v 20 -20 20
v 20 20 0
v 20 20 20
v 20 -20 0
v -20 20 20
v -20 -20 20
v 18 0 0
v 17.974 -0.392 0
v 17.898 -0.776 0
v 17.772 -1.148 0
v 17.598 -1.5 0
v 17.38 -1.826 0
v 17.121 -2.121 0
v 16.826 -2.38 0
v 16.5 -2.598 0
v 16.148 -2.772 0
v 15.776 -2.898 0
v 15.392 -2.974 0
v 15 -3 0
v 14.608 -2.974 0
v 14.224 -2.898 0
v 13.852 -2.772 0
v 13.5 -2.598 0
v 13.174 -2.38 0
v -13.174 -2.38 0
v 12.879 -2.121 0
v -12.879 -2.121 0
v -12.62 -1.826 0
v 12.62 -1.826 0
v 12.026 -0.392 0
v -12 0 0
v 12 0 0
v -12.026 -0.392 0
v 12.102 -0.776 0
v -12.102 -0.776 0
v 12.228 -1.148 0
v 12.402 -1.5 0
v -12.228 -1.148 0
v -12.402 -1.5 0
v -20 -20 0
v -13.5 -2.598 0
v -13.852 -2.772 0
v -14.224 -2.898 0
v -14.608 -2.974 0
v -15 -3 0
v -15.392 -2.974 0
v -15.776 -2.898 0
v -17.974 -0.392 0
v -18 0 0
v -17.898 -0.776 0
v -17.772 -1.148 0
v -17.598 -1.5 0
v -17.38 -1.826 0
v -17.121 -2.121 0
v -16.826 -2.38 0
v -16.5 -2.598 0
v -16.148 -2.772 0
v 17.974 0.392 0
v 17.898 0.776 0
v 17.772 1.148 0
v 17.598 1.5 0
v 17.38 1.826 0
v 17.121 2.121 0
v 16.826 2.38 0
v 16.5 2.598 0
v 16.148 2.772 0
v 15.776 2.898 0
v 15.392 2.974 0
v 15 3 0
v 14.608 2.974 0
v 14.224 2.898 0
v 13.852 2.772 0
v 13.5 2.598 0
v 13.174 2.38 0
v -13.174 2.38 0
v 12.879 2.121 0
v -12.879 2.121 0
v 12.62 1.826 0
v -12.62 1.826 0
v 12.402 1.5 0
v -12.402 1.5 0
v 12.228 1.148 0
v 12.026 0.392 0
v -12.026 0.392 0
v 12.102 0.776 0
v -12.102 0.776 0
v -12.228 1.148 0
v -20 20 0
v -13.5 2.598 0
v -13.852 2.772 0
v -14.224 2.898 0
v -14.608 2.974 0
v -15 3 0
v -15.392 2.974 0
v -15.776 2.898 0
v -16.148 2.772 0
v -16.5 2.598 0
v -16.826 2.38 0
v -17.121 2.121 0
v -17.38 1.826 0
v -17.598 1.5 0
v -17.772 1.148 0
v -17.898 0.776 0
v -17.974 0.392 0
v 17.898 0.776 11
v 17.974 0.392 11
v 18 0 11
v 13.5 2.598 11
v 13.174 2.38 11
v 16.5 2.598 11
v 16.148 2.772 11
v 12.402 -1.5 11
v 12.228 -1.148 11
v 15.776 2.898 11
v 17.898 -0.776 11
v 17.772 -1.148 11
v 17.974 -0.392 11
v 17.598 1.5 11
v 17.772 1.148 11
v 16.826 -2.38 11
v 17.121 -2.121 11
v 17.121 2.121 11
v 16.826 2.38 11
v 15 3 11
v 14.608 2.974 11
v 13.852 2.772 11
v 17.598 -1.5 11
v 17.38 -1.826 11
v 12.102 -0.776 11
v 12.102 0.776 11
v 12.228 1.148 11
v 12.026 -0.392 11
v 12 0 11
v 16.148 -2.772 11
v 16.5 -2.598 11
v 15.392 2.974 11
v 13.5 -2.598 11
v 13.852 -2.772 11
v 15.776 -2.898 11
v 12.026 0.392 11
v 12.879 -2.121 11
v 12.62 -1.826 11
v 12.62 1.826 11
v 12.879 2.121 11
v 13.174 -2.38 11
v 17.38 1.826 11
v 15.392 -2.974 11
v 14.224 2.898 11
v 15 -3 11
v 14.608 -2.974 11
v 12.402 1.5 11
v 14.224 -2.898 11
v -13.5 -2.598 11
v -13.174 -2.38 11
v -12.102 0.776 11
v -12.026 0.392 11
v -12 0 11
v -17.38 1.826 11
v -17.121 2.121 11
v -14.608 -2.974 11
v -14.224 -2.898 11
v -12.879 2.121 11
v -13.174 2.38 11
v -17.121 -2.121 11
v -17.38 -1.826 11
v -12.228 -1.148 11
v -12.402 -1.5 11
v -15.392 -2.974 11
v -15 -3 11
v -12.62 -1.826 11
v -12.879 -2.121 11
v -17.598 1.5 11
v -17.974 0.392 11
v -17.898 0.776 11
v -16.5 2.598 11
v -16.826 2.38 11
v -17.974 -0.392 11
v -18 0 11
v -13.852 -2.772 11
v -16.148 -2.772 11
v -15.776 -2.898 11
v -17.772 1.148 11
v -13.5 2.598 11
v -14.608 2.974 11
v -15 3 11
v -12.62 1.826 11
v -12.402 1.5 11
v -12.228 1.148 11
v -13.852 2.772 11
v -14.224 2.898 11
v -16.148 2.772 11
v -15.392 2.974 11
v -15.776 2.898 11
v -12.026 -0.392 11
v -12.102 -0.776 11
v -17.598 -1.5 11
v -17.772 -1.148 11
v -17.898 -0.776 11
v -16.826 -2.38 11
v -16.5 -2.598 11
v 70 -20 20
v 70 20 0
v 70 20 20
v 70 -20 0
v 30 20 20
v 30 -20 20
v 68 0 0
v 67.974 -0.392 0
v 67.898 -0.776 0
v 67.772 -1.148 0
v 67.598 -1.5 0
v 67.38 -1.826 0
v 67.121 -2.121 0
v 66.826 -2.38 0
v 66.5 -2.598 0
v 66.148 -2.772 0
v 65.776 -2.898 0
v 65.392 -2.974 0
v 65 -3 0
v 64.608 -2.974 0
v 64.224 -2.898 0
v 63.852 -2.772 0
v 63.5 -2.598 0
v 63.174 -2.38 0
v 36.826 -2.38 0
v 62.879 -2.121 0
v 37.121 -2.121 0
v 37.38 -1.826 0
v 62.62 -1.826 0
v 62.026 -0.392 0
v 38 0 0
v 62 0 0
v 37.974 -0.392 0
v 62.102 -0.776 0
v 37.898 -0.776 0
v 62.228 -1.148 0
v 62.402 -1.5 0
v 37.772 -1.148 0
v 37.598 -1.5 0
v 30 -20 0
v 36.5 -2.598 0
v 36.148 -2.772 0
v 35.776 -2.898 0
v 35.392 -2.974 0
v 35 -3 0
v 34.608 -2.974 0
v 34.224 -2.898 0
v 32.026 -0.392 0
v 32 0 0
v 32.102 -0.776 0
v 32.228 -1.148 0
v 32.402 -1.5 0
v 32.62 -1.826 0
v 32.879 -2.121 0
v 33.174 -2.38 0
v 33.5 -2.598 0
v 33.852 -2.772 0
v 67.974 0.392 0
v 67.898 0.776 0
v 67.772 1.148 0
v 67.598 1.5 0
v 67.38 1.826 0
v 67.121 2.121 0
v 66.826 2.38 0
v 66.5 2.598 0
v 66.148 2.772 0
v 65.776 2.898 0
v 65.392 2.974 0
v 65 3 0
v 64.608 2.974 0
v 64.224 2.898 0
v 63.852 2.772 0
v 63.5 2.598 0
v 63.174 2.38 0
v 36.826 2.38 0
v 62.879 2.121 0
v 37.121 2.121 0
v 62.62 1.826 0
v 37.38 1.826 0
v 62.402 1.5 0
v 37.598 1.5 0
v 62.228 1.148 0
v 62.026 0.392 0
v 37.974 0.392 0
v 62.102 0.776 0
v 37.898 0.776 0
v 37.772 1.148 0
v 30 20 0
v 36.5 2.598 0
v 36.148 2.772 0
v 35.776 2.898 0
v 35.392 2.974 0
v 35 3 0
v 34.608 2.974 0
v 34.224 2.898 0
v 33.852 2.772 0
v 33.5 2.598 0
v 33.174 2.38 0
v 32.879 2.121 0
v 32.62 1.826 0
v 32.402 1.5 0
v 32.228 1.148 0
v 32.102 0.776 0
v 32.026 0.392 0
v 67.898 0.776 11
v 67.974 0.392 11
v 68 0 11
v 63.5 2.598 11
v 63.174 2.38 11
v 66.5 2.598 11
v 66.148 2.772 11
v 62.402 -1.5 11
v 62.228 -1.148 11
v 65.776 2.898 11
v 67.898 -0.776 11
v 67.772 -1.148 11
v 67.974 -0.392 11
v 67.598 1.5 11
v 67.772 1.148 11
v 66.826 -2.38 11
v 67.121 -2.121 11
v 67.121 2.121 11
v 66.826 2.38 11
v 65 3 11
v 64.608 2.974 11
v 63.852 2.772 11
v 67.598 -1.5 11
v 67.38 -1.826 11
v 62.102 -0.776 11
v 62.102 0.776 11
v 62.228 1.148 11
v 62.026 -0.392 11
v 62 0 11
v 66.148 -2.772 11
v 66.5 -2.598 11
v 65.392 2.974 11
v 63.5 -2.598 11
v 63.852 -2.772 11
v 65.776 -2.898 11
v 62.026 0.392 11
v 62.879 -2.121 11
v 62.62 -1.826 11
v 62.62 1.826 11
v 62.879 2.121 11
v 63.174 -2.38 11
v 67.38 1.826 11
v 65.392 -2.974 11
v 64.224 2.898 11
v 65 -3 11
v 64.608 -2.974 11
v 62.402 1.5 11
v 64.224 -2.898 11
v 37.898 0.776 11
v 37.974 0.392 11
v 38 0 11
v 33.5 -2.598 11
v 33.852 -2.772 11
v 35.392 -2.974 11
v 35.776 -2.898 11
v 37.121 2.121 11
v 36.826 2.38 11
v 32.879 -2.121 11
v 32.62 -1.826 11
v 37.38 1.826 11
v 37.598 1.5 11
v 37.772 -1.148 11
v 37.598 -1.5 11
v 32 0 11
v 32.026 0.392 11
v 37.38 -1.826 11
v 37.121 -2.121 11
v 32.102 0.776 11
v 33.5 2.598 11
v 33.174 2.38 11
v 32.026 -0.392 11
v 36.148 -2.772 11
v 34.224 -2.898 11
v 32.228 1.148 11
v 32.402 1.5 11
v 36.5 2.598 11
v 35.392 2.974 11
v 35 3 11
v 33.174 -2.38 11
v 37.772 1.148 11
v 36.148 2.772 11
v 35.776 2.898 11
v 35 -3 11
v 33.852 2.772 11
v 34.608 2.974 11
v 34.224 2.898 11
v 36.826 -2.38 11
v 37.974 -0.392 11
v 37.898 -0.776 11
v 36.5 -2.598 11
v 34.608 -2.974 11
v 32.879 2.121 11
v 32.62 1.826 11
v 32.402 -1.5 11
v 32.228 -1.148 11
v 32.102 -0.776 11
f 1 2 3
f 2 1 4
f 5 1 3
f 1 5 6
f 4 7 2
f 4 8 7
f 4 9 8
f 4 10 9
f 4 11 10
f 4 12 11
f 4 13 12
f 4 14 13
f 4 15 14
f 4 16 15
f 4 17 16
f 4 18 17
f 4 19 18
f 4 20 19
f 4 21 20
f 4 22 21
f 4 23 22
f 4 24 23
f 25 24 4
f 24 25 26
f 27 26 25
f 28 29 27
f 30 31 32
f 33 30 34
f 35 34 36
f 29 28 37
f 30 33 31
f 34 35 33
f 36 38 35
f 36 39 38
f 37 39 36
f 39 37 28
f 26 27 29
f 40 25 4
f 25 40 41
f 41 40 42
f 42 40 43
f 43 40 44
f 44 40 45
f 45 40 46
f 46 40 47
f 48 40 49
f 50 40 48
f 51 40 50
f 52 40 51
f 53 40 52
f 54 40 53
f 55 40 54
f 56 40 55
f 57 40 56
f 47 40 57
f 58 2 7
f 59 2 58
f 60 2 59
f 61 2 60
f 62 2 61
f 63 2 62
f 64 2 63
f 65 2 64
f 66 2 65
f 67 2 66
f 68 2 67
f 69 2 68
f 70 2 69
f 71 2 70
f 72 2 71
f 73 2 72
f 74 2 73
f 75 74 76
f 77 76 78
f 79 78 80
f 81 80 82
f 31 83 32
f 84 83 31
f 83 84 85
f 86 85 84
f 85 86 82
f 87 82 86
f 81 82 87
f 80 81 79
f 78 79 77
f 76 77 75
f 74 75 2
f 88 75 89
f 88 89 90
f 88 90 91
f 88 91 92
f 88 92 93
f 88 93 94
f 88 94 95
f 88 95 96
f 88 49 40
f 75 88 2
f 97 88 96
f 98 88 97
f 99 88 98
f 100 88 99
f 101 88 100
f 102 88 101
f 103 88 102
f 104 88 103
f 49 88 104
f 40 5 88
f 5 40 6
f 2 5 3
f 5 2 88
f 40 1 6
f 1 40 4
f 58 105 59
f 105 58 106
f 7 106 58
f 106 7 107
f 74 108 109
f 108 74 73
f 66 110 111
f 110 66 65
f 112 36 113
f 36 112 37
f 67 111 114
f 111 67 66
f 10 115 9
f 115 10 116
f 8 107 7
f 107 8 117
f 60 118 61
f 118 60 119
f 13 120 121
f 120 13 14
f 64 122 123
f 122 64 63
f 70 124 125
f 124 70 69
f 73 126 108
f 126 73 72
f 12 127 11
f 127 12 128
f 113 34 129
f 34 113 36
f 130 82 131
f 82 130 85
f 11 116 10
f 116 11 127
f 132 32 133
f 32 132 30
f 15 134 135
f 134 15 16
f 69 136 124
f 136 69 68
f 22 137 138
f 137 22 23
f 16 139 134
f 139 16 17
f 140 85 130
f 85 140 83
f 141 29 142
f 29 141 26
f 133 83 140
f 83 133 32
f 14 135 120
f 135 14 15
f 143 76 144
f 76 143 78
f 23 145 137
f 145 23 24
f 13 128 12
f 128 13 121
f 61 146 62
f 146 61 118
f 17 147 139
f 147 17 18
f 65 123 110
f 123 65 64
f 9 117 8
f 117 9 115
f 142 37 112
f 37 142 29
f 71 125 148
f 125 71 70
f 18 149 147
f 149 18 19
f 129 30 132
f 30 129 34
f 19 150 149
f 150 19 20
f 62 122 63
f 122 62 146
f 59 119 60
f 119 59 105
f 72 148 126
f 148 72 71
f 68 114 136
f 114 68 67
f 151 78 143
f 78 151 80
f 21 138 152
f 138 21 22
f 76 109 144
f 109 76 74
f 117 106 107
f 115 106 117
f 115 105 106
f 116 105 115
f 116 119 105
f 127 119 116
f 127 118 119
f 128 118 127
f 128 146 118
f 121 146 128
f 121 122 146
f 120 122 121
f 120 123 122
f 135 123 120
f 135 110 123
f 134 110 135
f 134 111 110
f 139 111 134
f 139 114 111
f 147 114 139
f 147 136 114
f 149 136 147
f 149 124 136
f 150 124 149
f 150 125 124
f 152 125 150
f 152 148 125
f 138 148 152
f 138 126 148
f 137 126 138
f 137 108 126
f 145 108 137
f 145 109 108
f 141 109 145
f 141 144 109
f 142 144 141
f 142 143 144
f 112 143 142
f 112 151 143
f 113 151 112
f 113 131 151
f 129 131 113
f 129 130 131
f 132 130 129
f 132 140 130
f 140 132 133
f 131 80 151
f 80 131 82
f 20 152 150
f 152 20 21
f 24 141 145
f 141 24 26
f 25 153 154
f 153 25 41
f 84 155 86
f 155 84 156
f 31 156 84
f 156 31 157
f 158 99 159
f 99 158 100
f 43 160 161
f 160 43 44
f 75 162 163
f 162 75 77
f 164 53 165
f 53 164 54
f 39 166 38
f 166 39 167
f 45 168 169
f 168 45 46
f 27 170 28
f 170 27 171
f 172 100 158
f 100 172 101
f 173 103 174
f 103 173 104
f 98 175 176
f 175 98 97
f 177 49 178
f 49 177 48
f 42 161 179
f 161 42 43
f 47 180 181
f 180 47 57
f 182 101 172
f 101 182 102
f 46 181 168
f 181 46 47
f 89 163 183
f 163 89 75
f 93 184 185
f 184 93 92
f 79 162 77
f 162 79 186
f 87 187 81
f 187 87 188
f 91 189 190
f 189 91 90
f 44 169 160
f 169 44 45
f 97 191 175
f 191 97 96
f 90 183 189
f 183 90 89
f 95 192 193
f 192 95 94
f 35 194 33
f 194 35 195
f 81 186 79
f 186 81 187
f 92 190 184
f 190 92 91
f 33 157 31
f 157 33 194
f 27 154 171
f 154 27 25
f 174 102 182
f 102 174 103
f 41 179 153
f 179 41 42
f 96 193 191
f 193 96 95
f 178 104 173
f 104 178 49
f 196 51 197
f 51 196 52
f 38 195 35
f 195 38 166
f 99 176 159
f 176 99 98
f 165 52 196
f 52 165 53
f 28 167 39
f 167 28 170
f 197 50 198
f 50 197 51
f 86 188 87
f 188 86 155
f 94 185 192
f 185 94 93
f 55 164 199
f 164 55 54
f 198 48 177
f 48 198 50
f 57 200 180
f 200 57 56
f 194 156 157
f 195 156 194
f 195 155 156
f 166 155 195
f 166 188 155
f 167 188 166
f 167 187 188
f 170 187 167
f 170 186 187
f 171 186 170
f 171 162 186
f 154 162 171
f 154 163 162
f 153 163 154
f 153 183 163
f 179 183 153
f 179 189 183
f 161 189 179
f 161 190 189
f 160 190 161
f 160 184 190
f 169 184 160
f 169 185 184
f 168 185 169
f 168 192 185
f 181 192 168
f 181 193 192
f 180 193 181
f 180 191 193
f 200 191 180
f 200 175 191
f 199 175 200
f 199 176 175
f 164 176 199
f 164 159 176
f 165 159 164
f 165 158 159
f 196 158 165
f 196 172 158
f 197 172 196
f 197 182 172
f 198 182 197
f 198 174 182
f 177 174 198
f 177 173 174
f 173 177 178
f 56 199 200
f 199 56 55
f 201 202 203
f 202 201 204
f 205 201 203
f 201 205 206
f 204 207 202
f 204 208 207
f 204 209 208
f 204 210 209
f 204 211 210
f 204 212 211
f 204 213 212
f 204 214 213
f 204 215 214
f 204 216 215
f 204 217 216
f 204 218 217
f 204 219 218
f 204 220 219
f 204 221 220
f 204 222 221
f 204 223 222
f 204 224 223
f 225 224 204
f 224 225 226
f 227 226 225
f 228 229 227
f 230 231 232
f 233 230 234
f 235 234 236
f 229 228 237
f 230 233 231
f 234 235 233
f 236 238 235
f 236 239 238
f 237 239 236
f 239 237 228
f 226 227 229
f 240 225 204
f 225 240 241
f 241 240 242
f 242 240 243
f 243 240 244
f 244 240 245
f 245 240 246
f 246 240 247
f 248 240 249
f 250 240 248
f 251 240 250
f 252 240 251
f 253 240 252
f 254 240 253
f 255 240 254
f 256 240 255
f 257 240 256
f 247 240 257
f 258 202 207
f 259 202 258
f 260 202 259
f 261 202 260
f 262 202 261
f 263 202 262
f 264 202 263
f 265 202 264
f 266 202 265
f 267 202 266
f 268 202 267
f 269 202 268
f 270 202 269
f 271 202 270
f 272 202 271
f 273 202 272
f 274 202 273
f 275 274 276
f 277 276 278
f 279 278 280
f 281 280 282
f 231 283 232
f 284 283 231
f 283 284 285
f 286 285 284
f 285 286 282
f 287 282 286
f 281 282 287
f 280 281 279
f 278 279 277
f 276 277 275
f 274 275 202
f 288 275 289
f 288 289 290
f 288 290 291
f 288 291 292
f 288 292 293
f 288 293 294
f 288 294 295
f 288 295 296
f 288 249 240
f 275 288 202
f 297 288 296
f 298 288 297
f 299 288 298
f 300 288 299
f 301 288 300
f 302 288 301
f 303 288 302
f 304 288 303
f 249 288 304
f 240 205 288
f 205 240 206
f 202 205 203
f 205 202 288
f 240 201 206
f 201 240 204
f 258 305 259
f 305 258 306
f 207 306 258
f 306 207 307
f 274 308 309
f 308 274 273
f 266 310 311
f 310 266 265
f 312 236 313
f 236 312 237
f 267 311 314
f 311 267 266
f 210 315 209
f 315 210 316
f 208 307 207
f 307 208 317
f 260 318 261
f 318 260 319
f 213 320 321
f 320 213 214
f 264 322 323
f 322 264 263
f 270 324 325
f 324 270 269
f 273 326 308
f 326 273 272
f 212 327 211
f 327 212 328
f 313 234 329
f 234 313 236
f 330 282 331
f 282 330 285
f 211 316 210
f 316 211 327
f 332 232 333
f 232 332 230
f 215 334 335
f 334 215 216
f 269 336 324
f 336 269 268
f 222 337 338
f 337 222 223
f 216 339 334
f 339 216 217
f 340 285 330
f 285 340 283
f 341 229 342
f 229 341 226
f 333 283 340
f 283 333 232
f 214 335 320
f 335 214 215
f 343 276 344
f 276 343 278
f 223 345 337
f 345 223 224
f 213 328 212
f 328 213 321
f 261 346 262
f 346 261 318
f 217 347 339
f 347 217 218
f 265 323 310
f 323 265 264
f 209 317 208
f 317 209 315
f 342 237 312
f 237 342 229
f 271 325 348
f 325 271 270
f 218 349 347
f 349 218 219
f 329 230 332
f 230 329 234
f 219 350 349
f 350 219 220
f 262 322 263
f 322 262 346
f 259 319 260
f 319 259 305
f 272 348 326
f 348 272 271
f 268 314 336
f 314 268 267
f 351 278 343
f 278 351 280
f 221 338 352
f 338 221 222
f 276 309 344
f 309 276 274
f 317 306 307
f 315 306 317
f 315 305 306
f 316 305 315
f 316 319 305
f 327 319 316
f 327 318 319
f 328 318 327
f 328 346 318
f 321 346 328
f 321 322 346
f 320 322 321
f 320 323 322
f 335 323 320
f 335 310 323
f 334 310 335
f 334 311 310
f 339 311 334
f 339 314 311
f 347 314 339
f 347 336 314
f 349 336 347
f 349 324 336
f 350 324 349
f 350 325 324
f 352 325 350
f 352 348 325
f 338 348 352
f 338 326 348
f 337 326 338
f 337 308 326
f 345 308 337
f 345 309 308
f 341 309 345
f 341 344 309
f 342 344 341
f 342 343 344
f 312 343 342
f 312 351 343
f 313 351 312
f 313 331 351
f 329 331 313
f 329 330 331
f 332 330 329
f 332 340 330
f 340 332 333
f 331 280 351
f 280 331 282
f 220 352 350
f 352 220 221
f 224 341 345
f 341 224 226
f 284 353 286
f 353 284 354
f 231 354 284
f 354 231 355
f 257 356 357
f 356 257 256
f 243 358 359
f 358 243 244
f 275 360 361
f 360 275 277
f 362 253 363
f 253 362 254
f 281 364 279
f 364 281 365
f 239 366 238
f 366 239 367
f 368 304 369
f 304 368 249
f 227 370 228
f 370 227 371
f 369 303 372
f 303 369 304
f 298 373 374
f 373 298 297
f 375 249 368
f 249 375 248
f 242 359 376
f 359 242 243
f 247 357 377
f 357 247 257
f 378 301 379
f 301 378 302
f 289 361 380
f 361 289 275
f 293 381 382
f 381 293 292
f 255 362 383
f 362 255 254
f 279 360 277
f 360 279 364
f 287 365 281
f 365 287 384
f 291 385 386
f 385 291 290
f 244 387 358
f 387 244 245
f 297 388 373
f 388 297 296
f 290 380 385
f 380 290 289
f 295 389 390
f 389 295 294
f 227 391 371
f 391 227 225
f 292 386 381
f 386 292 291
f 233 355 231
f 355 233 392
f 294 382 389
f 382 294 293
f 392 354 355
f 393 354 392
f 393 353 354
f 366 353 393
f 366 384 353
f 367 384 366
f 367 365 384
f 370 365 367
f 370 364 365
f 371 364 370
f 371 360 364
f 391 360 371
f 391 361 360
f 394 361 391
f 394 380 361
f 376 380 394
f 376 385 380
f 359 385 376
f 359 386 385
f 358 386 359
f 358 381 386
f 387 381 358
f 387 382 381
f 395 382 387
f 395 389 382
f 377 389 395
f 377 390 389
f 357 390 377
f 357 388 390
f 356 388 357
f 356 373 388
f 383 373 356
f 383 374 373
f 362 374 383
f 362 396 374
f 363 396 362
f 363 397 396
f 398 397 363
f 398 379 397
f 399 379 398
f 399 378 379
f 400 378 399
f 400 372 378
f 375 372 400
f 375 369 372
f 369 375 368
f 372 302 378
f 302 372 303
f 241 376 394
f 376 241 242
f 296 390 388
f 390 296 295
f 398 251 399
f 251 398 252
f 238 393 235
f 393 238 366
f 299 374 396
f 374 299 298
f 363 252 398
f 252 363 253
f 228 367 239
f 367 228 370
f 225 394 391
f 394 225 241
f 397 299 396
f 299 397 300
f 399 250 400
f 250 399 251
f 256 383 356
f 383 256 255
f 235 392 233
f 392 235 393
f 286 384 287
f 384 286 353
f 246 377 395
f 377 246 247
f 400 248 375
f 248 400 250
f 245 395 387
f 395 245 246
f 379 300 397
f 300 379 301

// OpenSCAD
// Generated by scadwright. Do not hand-edit —
// edit the Python source and regenerate.

$fn = 48;

union() {
    // Widget
    difference() {
        translate([-20, -20, 0]) {
            cube([40, 40, 20], center=false);
        }
        translate([15, 0, 0]) {
            cylinder(h=22, r=3, center=true);
        }
        translate([-15, 0, 0]) {
            cylinder(h=22, r=3, center=true);
        }
    }

    color("red") {
        translate([50, 0, 0]) {
            // Widget
            difference() {
                translate([-20, -20, 0]) {
                    cube([40, 40, 20], center=false);
                }
                translate([15, 0, 0]) {
                    cylinder(h=22, r=3, center=true);
                }
                translate([-15, 0, 0]) {
                    cylinder(h=22, r=3, center=true);
                }
            }
        }
    }
}
